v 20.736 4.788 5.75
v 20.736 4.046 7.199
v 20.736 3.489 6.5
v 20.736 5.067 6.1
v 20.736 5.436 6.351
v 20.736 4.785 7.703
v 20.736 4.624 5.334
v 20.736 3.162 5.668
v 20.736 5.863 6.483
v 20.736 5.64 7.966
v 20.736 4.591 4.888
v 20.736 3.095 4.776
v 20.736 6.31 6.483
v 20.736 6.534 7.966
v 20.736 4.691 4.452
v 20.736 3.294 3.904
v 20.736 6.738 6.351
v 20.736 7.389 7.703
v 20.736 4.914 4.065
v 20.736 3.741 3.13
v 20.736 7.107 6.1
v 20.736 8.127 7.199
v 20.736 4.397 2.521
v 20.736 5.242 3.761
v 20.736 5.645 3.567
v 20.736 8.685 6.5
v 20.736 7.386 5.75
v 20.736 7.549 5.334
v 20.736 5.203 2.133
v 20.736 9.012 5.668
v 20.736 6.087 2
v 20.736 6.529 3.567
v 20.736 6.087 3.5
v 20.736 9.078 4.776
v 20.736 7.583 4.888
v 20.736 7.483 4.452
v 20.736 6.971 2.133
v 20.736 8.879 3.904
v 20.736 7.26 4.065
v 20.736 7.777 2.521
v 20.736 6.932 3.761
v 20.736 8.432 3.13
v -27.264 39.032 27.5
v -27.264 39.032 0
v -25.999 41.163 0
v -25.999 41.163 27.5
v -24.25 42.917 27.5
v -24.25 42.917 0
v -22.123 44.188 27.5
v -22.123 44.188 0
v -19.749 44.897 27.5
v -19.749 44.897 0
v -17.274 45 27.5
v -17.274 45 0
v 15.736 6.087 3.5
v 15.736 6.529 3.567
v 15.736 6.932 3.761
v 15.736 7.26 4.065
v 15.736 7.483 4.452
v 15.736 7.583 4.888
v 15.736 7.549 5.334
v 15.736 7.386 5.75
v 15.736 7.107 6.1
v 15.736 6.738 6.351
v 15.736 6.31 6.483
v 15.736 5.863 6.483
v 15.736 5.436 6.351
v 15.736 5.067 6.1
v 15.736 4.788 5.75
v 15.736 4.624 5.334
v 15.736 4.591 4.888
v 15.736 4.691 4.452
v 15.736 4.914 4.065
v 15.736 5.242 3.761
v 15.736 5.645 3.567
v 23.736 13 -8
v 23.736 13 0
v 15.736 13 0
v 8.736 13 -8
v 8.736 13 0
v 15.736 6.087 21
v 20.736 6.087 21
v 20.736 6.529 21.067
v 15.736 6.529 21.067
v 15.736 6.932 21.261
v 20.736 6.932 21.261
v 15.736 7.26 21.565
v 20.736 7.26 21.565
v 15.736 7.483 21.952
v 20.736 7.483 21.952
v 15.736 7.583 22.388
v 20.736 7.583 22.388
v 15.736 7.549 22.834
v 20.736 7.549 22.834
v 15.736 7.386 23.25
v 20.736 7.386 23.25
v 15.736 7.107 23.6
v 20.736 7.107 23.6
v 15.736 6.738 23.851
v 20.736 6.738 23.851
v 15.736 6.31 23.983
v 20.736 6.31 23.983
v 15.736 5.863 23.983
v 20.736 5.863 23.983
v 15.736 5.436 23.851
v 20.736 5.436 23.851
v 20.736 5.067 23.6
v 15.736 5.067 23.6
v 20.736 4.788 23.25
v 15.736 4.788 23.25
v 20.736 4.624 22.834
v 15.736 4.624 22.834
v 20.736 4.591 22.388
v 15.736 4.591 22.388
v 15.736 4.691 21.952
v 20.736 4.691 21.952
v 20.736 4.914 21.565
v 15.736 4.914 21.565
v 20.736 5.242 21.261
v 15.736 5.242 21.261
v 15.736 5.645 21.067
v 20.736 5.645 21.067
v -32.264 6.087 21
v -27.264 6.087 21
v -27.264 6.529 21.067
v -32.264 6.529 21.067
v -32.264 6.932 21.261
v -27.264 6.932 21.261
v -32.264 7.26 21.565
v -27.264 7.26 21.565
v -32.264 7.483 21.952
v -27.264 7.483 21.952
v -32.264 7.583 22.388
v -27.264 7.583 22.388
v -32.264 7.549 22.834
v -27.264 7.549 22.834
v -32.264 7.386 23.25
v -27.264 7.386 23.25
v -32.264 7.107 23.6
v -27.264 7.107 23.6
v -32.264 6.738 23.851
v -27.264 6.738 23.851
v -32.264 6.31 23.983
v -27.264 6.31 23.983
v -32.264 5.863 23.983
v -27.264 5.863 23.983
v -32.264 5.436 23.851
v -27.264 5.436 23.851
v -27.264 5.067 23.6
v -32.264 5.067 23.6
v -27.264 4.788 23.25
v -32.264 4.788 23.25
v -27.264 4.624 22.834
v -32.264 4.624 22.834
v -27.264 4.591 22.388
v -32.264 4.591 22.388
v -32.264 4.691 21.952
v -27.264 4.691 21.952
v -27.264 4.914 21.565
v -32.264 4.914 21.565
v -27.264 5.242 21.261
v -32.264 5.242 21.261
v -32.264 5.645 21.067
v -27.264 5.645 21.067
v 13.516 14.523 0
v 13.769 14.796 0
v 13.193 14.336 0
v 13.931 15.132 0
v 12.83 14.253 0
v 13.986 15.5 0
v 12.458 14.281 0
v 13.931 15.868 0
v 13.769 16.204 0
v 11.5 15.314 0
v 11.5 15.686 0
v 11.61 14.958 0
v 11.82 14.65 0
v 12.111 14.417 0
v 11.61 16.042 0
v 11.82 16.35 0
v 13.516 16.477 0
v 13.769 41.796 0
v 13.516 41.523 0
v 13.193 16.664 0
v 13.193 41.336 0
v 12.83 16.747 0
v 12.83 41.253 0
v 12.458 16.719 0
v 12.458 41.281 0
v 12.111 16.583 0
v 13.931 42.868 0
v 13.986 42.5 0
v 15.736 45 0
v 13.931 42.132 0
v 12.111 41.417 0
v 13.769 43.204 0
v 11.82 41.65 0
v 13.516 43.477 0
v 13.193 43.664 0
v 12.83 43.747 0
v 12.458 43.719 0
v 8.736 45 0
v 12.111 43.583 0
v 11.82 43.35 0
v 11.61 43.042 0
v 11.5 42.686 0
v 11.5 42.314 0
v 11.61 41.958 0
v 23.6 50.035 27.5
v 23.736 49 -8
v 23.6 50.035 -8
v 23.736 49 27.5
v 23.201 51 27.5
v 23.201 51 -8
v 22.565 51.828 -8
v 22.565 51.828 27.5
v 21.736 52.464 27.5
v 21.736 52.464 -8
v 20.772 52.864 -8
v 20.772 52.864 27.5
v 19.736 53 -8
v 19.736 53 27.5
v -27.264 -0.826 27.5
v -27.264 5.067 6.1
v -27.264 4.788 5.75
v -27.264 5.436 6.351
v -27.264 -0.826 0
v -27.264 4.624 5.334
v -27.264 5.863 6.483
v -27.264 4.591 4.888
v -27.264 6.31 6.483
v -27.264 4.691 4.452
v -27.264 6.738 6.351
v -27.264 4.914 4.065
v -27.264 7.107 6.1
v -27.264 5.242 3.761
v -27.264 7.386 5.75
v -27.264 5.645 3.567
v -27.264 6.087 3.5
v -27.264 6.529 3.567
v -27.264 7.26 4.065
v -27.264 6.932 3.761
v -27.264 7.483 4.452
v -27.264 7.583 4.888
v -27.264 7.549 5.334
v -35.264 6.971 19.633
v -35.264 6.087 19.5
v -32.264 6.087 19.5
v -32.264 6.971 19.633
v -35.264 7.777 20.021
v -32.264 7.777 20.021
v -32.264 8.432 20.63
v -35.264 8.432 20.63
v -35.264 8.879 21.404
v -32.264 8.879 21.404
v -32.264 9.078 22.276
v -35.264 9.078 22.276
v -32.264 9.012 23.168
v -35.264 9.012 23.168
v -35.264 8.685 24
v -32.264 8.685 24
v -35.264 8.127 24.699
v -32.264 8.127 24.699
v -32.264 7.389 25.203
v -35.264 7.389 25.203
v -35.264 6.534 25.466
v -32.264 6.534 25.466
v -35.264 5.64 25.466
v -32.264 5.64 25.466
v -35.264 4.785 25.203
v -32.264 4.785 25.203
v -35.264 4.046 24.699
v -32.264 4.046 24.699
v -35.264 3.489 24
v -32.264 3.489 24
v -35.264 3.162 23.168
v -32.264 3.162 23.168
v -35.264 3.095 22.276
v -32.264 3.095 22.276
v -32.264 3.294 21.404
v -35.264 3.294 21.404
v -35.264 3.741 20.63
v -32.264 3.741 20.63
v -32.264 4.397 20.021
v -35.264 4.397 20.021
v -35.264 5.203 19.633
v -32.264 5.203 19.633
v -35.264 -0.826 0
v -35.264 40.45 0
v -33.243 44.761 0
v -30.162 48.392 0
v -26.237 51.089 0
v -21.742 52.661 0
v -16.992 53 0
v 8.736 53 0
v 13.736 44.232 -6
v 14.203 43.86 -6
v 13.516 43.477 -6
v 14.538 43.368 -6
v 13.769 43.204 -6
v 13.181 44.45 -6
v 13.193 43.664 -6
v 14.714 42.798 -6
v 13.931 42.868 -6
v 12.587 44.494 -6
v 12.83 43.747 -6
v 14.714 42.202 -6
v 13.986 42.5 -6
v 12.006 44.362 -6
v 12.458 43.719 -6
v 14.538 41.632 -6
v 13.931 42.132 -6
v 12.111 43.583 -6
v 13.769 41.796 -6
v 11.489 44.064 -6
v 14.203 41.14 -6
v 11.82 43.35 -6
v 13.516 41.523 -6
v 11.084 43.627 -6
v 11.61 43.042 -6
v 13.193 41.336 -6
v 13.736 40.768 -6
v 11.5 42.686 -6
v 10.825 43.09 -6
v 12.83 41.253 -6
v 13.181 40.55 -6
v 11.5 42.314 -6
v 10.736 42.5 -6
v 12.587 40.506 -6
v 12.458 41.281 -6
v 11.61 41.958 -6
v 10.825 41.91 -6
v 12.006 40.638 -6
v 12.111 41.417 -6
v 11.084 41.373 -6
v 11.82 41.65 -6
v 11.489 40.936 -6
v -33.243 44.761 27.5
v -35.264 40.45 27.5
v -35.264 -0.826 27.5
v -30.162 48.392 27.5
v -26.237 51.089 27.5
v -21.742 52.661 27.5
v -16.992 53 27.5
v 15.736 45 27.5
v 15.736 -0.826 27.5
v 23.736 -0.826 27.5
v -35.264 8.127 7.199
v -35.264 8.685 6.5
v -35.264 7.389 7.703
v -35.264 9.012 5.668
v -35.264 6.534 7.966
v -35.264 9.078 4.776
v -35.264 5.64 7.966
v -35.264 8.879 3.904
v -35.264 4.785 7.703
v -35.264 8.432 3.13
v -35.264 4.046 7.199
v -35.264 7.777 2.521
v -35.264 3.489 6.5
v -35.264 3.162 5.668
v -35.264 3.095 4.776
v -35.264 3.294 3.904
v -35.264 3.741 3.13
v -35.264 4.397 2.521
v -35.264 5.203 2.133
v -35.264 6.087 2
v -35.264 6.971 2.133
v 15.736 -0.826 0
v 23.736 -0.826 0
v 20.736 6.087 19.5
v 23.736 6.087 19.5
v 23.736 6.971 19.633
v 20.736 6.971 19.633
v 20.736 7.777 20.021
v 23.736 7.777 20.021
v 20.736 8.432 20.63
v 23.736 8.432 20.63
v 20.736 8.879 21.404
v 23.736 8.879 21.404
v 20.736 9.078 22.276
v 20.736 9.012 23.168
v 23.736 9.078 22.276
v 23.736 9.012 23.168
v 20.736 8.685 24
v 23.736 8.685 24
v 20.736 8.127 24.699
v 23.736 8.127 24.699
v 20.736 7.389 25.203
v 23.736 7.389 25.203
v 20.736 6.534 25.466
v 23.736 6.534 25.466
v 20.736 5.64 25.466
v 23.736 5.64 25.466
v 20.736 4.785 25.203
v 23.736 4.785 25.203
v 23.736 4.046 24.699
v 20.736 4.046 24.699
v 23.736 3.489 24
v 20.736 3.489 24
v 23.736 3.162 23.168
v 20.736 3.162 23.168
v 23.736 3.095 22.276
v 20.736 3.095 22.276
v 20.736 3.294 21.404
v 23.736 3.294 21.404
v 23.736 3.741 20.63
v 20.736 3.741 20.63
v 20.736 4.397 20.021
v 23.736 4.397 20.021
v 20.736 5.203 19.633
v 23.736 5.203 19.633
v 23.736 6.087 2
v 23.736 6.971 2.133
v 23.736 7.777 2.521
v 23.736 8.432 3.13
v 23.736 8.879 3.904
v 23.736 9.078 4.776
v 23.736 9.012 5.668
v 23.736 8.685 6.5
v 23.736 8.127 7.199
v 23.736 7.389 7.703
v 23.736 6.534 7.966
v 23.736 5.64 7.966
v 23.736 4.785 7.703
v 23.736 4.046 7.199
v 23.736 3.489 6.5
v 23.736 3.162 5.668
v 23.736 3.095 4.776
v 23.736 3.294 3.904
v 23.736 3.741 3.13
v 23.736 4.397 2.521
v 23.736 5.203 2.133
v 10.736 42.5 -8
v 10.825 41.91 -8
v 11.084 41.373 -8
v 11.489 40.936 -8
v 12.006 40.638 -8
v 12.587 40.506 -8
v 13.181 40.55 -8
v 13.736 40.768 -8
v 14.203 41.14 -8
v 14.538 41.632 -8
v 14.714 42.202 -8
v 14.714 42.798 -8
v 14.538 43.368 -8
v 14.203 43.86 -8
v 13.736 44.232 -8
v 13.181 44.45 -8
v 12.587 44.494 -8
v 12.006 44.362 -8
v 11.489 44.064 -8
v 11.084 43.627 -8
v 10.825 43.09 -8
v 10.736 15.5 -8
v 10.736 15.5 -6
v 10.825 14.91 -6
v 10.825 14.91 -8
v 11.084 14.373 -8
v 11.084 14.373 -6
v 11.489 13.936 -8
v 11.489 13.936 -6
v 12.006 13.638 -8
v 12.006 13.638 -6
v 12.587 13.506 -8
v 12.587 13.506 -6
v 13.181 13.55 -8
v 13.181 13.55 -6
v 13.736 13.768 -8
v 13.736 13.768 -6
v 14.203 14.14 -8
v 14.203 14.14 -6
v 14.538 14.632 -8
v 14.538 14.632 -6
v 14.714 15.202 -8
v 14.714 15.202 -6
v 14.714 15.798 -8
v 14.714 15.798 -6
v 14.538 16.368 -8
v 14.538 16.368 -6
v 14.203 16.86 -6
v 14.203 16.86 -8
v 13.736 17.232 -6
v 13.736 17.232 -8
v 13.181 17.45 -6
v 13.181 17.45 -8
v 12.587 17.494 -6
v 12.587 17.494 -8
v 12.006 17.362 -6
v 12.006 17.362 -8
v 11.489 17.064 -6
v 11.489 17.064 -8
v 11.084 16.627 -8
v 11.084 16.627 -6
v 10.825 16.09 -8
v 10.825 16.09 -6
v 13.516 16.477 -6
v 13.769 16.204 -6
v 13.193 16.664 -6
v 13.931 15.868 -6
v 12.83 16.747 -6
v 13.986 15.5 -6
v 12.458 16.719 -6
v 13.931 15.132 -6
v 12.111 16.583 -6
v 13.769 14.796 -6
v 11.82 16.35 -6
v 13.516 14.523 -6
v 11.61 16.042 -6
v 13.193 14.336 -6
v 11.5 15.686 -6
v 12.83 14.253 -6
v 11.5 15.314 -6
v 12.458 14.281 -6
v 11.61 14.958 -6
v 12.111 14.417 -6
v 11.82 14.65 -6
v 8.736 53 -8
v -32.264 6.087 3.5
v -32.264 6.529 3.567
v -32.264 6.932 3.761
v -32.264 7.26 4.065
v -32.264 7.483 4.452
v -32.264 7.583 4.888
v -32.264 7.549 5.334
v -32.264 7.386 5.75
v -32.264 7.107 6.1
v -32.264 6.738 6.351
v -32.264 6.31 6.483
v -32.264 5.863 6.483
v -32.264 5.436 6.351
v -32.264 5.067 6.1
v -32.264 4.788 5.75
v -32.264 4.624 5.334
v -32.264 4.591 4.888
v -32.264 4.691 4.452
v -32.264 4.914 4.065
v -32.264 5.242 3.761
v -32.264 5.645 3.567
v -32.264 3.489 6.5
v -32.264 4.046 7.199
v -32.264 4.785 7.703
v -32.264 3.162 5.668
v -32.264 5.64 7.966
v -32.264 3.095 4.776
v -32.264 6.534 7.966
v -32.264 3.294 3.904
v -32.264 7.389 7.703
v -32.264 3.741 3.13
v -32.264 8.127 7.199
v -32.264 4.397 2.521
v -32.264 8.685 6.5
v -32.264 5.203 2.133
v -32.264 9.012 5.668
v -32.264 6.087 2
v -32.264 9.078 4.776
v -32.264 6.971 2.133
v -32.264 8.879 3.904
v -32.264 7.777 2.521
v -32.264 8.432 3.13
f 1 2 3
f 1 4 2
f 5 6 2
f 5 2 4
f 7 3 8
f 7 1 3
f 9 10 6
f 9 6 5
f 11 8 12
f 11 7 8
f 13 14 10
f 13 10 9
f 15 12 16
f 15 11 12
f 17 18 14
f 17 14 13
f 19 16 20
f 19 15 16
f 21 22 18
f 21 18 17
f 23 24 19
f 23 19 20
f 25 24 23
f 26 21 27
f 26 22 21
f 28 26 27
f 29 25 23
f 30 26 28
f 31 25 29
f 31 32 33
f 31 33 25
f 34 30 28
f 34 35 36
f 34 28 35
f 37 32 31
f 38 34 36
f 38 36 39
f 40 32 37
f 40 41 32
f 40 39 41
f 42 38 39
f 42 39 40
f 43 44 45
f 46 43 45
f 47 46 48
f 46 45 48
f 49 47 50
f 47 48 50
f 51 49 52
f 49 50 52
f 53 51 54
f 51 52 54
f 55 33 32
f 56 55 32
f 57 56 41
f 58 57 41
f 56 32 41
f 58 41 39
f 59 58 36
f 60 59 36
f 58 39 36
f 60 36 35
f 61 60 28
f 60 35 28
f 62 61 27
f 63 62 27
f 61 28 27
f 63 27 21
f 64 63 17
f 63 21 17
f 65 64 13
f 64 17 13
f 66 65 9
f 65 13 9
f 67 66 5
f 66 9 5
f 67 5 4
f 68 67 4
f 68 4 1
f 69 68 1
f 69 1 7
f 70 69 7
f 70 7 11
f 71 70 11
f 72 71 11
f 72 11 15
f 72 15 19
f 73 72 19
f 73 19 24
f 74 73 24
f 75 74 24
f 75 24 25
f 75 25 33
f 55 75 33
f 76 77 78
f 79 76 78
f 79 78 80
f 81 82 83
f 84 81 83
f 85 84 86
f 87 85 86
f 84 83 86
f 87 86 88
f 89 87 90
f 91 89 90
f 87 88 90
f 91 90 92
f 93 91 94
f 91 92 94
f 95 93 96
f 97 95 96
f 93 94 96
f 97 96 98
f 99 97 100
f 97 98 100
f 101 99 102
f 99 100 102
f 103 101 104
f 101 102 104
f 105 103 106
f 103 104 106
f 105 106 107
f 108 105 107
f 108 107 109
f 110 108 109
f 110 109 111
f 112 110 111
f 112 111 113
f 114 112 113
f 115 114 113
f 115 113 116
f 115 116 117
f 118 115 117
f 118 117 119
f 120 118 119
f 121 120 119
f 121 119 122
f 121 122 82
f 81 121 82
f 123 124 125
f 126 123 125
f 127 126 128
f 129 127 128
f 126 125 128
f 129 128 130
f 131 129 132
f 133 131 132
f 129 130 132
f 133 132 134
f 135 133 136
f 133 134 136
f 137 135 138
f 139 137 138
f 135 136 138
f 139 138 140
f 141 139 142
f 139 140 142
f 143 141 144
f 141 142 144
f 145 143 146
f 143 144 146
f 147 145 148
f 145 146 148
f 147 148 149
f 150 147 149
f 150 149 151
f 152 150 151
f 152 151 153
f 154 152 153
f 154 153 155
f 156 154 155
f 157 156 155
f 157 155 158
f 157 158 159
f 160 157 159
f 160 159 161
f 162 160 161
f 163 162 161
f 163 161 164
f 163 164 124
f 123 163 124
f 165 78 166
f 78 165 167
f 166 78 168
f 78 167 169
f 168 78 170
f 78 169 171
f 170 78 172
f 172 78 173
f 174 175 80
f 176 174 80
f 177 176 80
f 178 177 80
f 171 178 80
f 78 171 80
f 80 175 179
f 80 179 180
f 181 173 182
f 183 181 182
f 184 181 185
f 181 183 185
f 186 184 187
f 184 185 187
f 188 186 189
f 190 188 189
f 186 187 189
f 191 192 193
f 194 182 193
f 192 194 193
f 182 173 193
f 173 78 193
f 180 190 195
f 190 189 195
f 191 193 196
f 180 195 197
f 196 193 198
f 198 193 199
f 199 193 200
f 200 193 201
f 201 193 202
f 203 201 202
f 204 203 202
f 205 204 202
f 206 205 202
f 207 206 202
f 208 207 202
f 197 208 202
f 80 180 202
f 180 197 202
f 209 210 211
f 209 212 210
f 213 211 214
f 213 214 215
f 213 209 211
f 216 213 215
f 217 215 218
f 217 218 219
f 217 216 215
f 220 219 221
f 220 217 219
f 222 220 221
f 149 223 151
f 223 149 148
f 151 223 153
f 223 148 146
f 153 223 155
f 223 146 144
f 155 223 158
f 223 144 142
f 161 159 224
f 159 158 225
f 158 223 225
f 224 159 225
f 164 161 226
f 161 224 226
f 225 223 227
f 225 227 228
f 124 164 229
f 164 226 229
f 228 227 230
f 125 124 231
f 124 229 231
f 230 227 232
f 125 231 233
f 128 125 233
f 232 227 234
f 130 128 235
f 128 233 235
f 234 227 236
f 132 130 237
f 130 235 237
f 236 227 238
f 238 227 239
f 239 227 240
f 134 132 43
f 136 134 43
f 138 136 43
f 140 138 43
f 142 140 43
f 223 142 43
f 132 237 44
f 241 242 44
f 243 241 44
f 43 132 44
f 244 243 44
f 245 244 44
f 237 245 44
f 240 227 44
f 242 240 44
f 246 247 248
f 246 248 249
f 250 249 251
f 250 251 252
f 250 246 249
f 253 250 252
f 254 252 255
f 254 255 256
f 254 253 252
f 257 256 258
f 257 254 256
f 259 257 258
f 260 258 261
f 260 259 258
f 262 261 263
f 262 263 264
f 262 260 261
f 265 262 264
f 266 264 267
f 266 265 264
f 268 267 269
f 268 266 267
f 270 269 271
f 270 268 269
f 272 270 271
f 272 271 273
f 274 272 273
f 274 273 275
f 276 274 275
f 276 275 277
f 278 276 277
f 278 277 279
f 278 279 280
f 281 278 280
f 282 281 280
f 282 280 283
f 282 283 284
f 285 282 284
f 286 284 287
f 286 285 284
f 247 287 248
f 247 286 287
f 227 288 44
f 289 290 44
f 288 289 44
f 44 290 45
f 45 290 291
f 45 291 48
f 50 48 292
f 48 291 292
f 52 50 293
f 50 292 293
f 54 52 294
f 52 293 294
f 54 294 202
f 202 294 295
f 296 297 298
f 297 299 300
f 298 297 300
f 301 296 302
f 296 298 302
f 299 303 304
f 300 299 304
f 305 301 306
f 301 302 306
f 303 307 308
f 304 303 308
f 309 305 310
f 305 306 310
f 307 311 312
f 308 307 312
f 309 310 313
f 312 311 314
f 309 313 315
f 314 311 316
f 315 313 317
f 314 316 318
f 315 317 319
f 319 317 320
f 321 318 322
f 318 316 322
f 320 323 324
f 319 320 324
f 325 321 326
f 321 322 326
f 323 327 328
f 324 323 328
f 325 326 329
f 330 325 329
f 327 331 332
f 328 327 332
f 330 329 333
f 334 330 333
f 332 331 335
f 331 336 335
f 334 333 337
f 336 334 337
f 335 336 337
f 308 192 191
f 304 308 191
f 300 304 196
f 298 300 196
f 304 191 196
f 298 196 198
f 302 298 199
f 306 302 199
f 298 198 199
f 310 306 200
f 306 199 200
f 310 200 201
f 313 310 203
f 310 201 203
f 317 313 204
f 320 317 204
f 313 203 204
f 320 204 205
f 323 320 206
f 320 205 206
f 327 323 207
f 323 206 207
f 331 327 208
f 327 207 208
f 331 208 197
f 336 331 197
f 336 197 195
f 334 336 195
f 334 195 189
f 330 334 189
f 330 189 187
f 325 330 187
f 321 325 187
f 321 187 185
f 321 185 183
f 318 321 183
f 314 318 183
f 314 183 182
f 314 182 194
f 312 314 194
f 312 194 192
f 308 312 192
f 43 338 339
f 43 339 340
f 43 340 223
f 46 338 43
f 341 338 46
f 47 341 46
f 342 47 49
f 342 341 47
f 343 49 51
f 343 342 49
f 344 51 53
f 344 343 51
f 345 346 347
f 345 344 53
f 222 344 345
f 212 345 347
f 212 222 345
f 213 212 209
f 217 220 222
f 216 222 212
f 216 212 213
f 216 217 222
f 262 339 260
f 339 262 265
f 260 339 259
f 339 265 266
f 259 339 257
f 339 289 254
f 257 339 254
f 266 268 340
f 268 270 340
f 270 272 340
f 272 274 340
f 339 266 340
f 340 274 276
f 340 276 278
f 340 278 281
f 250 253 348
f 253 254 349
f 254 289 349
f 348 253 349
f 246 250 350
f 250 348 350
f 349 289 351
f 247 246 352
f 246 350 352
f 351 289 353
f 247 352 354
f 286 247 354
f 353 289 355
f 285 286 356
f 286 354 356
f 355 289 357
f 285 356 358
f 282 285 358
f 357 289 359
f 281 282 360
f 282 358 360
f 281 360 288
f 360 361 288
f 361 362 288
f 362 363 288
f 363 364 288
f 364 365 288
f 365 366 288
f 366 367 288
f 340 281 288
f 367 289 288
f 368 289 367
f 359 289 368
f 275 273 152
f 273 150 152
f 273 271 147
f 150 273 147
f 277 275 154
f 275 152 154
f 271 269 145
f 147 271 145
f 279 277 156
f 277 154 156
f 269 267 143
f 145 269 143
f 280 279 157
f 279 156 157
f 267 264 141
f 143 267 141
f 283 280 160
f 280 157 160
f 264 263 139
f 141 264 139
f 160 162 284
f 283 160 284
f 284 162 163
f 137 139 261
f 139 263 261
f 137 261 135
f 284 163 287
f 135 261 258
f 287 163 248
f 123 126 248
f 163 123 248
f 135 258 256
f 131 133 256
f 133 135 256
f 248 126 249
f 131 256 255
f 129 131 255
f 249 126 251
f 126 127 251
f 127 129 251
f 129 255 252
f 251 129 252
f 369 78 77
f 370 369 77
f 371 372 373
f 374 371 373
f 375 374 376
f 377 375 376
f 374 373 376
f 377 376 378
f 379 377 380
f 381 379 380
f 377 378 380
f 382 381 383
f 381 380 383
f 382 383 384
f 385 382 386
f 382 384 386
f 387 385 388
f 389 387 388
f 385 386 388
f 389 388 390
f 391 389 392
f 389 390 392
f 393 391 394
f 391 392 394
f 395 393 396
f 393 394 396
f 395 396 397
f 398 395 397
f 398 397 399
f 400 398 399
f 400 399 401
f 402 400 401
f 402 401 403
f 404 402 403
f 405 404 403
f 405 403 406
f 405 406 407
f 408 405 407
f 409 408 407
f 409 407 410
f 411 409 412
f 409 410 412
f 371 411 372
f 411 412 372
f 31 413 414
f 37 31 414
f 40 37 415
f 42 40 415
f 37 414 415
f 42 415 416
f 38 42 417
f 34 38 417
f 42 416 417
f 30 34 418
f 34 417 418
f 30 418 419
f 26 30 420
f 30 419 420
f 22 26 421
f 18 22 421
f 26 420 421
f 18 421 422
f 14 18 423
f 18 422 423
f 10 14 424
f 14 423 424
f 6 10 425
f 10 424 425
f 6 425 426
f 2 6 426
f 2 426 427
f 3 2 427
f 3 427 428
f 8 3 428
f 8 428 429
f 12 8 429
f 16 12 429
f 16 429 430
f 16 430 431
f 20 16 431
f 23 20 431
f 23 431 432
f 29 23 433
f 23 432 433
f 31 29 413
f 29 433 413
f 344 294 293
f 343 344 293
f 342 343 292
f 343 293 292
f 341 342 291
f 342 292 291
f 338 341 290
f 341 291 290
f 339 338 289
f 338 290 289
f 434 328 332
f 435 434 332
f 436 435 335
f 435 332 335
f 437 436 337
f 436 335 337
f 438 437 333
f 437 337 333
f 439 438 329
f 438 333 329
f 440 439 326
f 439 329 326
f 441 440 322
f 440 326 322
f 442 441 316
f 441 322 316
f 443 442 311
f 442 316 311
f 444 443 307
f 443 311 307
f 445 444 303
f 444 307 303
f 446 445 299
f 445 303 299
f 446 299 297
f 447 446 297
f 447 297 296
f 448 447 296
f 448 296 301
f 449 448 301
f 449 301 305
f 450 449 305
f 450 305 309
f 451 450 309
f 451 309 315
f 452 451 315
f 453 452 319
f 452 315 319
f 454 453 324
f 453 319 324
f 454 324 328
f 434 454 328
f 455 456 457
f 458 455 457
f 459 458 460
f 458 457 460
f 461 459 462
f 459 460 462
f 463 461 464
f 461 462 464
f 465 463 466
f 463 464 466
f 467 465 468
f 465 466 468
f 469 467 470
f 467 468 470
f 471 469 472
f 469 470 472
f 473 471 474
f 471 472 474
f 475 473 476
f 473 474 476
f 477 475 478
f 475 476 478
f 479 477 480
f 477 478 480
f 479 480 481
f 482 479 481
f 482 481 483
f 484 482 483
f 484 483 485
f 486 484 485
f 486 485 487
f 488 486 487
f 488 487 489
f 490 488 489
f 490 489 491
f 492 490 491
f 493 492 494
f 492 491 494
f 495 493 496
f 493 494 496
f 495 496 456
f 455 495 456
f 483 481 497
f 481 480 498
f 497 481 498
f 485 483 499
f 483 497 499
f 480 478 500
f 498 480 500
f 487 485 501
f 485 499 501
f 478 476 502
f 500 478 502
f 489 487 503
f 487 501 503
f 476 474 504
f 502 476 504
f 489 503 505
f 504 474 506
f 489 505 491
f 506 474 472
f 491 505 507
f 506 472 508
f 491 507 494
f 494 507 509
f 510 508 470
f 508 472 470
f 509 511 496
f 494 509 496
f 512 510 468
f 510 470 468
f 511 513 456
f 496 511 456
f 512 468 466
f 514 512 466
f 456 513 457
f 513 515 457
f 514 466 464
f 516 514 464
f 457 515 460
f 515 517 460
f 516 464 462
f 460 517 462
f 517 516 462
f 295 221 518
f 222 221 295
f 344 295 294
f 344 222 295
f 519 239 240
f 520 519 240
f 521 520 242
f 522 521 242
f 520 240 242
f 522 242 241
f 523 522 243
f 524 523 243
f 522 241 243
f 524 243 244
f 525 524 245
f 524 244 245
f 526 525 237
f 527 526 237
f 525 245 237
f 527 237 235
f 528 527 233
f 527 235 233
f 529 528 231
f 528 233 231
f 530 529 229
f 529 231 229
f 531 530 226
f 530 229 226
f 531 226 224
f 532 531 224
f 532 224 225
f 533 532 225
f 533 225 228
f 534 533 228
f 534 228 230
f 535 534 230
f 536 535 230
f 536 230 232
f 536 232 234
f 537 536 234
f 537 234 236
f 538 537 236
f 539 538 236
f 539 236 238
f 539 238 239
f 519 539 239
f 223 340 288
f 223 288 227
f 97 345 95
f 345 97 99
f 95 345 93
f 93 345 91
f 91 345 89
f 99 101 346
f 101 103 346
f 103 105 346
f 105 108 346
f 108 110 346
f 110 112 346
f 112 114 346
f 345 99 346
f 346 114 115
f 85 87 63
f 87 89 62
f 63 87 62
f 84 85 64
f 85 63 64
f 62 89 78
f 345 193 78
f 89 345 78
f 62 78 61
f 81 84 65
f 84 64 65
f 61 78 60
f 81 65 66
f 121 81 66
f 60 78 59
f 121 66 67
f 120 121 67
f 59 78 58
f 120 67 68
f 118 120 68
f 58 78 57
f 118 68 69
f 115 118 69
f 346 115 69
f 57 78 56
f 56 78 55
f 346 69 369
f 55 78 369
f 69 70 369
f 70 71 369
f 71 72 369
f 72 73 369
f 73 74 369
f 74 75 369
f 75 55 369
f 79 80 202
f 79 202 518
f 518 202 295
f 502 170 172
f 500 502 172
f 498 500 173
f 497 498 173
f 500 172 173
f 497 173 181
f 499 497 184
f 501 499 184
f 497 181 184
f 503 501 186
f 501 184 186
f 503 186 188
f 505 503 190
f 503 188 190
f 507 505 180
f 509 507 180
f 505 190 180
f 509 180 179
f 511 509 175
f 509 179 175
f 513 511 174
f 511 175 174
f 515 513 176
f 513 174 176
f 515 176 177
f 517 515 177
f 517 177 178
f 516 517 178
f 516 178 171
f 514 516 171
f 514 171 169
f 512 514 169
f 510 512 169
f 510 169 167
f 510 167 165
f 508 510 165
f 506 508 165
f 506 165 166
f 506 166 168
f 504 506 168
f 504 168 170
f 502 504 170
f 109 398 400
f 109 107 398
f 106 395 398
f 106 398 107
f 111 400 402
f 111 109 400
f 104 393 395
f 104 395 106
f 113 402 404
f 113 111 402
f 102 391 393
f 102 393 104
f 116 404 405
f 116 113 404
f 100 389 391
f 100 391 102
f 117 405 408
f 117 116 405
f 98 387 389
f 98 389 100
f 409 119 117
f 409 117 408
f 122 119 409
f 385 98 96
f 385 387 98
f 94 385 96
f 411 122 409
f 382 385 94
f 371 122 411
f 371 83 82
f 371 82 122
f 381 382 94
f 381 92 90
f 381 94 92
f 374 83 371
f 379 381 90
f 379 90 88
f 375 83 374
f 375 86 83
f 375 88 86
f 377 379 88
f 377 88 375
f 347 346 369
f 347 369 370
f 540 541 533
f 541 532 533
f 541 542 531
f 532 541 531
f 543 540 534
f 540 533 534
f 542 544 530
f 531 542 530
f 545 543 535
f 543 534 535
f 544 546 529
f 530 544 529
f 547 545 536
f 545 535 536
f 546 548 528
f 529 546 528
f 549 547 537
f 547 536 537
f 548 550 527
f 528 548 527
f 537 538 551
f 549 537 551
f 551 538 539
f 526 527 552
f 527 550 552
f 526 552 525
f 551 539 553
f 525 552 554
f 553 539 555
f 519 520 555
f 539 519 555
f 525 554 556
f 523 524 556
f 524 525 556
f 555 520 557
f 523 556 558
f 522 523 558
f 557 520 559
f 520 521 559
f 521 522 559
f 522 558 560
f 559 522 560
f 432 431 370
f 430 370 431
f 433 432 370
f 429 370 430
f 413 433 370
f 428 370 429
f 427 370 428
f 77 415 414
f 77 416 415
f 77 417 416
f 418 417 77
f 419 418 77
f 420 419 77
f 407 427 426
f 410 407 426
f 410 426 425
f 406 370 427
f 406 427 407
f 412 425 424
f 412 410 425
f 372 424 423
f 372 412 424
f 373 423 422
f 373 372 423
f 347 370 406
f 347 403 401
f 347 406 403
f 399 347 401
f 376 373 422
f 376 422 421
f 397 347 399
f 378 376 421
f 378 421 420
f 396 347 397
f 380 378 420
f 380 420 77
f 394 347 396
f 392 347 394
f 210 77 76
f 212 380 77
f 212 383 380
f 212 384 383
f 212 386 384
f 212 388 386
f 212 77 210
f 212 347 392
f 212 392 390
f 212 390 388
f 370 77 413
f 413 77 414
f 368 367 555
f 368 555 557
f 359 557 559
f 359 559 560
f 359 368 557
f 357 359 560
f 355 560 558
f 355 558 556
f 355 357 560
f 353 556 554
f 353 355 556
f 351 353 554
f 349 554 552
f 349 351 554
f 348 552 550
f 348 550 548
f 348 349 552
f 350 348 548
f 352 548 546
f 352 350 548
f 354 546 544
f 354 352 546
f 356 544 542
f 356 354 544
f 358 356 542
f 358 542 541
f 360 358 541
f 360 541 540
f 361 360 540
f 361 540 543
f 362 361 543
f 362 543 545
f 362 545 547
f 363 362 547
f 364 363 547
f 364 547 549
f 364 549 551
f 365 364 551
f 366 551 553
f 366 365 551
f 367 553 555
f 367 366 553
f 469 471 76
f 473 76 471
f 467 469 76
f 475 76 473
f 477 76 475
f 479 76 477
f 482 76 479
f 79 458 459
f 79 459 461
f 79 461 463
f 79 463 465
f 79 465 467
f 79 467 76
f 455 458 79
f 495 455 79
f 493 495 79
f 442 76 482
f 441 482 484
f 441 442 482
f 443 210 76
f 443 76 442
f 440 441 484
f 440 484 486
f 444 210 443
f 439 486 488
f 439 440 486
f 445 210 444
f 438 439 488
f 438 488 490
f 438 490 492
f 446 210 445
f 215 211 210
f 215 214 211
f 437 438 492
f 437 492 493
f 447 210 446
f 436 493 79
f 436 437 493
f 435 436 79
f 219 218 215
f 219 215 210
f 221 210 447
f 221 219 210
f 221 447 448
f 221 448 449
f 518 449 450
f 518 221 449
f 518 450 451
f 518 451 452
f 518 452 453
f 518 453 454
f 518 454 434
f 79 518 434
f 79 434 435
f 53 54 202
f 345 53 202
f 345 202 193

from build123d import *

# Parameters (mm, degrees)
BOSS_EXTRUDE1_DEPTH = 27.5
SKETCH3_W           = 15
SKETCH3_H           = 40
BOSS_EXTRUDE2_DEPTH = 8
SKETCH4_R           = 1.25
CUT_EXTRUDE1_DEPTH  = 70.371250359
CUT_EXTRUDE2_START  = -6
SKETCH4_3_R         = 2
SKETCH4_3_R_2       = 1.25
CUT_EXTRUDE2_DEPTH  = 2
SKETCH5_R           = 1.5
CUT_EXTRUDE3_DEPTH  = 84.963392862
SKETCH5_3_R         = 3
SKETCH5_3_R_2       = 1.5
CUT_EXTRUDE4_DEPTH  = 3
FILLET1_R           = 4


with BuildPart() as part:
    # Sketch1 → Boss-Extrude1 (new body)
    with BuildSketch(Plane.XY):
        with BuildLine():
            Line((-27.263565268, -0.826290167), (-27.263565268, 39.032085652))
            ThreePointArc((-27.263565268, 39.032085652), (-23.226265639, 43.618644017), (-17.274109595, 45))
            Line((-17.274109595, 45), (15.736434732, 45))
            Line((15.736434732, 45), (15.736434732, -0.826290167))
            Line((15.736434732, -0.826290167), (23.736434732, -0.826290167))
            Line((23.736434732, -0.826290167), (23.736434732, 53))
            Line((23.736434732, 53), (-16.992356062, 53))
            ThreePointArc((-16.992356062, 53), (-28.288998955, 49.870920305), (-35.263565268, 40.449630311))
            Line((-35.263565268, 40.449630311), (-35.263565268, -0.826290167))
            Line((-35.263565268, -0.826290167), (-27.263565268, -0.826290167))
        make_face()
    extrude(amount=BOSS_EXTRUDE1_DEPTH)

    # Sketch3 → Boss-Extrude2 (add)
    with BuildSketch(Plane(origin=(0, 0, 0), x_dir=(-1, 0, 0), z_dir=(0, 0, -1))):
        with Locations((-16.236434732, 33)):
            Rectangle(SKETCH3_W, SKETCH3_H)
    extrude(amount=BOSS_EXTRUDE2_DEPTH)

    # Sketch4 → Cut-Extrude1 (cut, through all)
    with BuildSketch(Plane.XY):
        with Locations((12.736434732, 42.5)):
            Circle(SKETCH4_R)
        with Locations((12.736434732, 15.5)):
            Circle(SKETCH4_R)
    extrude(amount=-CUT_EXTRUDE1_DEPTH, mode=Mode.SUBTRACT)

    # Sketch4<3> → Cut-Extrude2 (cut)
    # profile 1 of 2: a face of its own
    with BuildSketch(Plane.XY.offset(CUT_EXTRUDE2_START)):
        with Locations(Location((12.736434732, 42.5, 0), (0, 0, 180))):
            Circle(SKETCH4_3_R)
        with Locations((12.736434732, 42.5)):
            Circle(SKETCH4_3_R_2, mode=Mode.SUBTRACT)
    # profile 2 of 2: a face of its own
    with BuildSketch(Plane.XY.offset(CUT_EXTRUDE2_START)):
        with Locations(Location((12.736434732, 15.5, 0), (0, 0, 180))):
            Circle(SKETCH4_3_R)
        with Locations((12.736434732, 15.5)):
            Circle(SKETCH4_3_R_2, mode=Mode.SUBTRACT)
    extrude(amount=-CUT_EXTRUDE2_DEPTH, mode=Mode.SUBTRACT)

    # Sketch5 → Cut-Extrude3 (cut, through all)
    with BuildSketch(Plane(origin=(23.736434732, 0, 0), x_dir=(0, 0, -1), z_dir=(1, 0, 0))):
        with Locations((-22.5, 6.086854916)):
            Circle(SKETCH5_R)
        with Locations((-5, 6.086854916)):
            Circle(SKETCH5_R)
    extrude(amount=-CUT_EXTRUDE3_DEPTH, mode=Mode.SUBTRACT)

    # Sketch5<3> → Cut-Extrude4 (cut)
    # profile 1 of 2: a face of its own
    with BuildSketch(Plane(origin=(23.736434732, 0, 0), x_dir=(0, 0, -1), z_dir=(1, 0, 0))):
        with Locations((-22.5, 6.086854916)):
            Circle(SKETCH5_3_R)
        with Locations((-22.5, 6.086854916)):
            Circle(SKETCH5_3_R_2, mode=Mode.SUBTRACT)
    # profile 2 of 2: a face of its own
    with BuildSketch(Plane(origin=(23.736434732, 0, 0), x_dir=(0, 0, -1), z_dir=(1, 0, 0))):
        with Locations((-5, 6.086854916)):
            Circle(SKETCH5_3_R)
        with Locations((-5, 6.086854916)):
            Circle(SKETCH5_3_R_2, mode=Mode.SUBTRACT)
    cut_extrude4 = extrude(amount=-CUT_EXTRUDE4_DEPTH, mode=Mode.SUBTRACT)

    # Mirror1: Cut-Extrude4 across plane
    add(cut_extrude4.mirror(Plane(origin=(-5.763565268, 0, 0), x_dir=(0, 0, 1), z_dir=(1, 0, 0))), mode=Mode.SUBTRACT)

    # Fillet1
    fillet1_edges = [part.edges().sort_by_distance(p)[0] for p in [
        (23.736434732, 53, 9.75),
    ]]
    fillet(fillet1_edges, radius=FILLET1_R)


solid = part.part
